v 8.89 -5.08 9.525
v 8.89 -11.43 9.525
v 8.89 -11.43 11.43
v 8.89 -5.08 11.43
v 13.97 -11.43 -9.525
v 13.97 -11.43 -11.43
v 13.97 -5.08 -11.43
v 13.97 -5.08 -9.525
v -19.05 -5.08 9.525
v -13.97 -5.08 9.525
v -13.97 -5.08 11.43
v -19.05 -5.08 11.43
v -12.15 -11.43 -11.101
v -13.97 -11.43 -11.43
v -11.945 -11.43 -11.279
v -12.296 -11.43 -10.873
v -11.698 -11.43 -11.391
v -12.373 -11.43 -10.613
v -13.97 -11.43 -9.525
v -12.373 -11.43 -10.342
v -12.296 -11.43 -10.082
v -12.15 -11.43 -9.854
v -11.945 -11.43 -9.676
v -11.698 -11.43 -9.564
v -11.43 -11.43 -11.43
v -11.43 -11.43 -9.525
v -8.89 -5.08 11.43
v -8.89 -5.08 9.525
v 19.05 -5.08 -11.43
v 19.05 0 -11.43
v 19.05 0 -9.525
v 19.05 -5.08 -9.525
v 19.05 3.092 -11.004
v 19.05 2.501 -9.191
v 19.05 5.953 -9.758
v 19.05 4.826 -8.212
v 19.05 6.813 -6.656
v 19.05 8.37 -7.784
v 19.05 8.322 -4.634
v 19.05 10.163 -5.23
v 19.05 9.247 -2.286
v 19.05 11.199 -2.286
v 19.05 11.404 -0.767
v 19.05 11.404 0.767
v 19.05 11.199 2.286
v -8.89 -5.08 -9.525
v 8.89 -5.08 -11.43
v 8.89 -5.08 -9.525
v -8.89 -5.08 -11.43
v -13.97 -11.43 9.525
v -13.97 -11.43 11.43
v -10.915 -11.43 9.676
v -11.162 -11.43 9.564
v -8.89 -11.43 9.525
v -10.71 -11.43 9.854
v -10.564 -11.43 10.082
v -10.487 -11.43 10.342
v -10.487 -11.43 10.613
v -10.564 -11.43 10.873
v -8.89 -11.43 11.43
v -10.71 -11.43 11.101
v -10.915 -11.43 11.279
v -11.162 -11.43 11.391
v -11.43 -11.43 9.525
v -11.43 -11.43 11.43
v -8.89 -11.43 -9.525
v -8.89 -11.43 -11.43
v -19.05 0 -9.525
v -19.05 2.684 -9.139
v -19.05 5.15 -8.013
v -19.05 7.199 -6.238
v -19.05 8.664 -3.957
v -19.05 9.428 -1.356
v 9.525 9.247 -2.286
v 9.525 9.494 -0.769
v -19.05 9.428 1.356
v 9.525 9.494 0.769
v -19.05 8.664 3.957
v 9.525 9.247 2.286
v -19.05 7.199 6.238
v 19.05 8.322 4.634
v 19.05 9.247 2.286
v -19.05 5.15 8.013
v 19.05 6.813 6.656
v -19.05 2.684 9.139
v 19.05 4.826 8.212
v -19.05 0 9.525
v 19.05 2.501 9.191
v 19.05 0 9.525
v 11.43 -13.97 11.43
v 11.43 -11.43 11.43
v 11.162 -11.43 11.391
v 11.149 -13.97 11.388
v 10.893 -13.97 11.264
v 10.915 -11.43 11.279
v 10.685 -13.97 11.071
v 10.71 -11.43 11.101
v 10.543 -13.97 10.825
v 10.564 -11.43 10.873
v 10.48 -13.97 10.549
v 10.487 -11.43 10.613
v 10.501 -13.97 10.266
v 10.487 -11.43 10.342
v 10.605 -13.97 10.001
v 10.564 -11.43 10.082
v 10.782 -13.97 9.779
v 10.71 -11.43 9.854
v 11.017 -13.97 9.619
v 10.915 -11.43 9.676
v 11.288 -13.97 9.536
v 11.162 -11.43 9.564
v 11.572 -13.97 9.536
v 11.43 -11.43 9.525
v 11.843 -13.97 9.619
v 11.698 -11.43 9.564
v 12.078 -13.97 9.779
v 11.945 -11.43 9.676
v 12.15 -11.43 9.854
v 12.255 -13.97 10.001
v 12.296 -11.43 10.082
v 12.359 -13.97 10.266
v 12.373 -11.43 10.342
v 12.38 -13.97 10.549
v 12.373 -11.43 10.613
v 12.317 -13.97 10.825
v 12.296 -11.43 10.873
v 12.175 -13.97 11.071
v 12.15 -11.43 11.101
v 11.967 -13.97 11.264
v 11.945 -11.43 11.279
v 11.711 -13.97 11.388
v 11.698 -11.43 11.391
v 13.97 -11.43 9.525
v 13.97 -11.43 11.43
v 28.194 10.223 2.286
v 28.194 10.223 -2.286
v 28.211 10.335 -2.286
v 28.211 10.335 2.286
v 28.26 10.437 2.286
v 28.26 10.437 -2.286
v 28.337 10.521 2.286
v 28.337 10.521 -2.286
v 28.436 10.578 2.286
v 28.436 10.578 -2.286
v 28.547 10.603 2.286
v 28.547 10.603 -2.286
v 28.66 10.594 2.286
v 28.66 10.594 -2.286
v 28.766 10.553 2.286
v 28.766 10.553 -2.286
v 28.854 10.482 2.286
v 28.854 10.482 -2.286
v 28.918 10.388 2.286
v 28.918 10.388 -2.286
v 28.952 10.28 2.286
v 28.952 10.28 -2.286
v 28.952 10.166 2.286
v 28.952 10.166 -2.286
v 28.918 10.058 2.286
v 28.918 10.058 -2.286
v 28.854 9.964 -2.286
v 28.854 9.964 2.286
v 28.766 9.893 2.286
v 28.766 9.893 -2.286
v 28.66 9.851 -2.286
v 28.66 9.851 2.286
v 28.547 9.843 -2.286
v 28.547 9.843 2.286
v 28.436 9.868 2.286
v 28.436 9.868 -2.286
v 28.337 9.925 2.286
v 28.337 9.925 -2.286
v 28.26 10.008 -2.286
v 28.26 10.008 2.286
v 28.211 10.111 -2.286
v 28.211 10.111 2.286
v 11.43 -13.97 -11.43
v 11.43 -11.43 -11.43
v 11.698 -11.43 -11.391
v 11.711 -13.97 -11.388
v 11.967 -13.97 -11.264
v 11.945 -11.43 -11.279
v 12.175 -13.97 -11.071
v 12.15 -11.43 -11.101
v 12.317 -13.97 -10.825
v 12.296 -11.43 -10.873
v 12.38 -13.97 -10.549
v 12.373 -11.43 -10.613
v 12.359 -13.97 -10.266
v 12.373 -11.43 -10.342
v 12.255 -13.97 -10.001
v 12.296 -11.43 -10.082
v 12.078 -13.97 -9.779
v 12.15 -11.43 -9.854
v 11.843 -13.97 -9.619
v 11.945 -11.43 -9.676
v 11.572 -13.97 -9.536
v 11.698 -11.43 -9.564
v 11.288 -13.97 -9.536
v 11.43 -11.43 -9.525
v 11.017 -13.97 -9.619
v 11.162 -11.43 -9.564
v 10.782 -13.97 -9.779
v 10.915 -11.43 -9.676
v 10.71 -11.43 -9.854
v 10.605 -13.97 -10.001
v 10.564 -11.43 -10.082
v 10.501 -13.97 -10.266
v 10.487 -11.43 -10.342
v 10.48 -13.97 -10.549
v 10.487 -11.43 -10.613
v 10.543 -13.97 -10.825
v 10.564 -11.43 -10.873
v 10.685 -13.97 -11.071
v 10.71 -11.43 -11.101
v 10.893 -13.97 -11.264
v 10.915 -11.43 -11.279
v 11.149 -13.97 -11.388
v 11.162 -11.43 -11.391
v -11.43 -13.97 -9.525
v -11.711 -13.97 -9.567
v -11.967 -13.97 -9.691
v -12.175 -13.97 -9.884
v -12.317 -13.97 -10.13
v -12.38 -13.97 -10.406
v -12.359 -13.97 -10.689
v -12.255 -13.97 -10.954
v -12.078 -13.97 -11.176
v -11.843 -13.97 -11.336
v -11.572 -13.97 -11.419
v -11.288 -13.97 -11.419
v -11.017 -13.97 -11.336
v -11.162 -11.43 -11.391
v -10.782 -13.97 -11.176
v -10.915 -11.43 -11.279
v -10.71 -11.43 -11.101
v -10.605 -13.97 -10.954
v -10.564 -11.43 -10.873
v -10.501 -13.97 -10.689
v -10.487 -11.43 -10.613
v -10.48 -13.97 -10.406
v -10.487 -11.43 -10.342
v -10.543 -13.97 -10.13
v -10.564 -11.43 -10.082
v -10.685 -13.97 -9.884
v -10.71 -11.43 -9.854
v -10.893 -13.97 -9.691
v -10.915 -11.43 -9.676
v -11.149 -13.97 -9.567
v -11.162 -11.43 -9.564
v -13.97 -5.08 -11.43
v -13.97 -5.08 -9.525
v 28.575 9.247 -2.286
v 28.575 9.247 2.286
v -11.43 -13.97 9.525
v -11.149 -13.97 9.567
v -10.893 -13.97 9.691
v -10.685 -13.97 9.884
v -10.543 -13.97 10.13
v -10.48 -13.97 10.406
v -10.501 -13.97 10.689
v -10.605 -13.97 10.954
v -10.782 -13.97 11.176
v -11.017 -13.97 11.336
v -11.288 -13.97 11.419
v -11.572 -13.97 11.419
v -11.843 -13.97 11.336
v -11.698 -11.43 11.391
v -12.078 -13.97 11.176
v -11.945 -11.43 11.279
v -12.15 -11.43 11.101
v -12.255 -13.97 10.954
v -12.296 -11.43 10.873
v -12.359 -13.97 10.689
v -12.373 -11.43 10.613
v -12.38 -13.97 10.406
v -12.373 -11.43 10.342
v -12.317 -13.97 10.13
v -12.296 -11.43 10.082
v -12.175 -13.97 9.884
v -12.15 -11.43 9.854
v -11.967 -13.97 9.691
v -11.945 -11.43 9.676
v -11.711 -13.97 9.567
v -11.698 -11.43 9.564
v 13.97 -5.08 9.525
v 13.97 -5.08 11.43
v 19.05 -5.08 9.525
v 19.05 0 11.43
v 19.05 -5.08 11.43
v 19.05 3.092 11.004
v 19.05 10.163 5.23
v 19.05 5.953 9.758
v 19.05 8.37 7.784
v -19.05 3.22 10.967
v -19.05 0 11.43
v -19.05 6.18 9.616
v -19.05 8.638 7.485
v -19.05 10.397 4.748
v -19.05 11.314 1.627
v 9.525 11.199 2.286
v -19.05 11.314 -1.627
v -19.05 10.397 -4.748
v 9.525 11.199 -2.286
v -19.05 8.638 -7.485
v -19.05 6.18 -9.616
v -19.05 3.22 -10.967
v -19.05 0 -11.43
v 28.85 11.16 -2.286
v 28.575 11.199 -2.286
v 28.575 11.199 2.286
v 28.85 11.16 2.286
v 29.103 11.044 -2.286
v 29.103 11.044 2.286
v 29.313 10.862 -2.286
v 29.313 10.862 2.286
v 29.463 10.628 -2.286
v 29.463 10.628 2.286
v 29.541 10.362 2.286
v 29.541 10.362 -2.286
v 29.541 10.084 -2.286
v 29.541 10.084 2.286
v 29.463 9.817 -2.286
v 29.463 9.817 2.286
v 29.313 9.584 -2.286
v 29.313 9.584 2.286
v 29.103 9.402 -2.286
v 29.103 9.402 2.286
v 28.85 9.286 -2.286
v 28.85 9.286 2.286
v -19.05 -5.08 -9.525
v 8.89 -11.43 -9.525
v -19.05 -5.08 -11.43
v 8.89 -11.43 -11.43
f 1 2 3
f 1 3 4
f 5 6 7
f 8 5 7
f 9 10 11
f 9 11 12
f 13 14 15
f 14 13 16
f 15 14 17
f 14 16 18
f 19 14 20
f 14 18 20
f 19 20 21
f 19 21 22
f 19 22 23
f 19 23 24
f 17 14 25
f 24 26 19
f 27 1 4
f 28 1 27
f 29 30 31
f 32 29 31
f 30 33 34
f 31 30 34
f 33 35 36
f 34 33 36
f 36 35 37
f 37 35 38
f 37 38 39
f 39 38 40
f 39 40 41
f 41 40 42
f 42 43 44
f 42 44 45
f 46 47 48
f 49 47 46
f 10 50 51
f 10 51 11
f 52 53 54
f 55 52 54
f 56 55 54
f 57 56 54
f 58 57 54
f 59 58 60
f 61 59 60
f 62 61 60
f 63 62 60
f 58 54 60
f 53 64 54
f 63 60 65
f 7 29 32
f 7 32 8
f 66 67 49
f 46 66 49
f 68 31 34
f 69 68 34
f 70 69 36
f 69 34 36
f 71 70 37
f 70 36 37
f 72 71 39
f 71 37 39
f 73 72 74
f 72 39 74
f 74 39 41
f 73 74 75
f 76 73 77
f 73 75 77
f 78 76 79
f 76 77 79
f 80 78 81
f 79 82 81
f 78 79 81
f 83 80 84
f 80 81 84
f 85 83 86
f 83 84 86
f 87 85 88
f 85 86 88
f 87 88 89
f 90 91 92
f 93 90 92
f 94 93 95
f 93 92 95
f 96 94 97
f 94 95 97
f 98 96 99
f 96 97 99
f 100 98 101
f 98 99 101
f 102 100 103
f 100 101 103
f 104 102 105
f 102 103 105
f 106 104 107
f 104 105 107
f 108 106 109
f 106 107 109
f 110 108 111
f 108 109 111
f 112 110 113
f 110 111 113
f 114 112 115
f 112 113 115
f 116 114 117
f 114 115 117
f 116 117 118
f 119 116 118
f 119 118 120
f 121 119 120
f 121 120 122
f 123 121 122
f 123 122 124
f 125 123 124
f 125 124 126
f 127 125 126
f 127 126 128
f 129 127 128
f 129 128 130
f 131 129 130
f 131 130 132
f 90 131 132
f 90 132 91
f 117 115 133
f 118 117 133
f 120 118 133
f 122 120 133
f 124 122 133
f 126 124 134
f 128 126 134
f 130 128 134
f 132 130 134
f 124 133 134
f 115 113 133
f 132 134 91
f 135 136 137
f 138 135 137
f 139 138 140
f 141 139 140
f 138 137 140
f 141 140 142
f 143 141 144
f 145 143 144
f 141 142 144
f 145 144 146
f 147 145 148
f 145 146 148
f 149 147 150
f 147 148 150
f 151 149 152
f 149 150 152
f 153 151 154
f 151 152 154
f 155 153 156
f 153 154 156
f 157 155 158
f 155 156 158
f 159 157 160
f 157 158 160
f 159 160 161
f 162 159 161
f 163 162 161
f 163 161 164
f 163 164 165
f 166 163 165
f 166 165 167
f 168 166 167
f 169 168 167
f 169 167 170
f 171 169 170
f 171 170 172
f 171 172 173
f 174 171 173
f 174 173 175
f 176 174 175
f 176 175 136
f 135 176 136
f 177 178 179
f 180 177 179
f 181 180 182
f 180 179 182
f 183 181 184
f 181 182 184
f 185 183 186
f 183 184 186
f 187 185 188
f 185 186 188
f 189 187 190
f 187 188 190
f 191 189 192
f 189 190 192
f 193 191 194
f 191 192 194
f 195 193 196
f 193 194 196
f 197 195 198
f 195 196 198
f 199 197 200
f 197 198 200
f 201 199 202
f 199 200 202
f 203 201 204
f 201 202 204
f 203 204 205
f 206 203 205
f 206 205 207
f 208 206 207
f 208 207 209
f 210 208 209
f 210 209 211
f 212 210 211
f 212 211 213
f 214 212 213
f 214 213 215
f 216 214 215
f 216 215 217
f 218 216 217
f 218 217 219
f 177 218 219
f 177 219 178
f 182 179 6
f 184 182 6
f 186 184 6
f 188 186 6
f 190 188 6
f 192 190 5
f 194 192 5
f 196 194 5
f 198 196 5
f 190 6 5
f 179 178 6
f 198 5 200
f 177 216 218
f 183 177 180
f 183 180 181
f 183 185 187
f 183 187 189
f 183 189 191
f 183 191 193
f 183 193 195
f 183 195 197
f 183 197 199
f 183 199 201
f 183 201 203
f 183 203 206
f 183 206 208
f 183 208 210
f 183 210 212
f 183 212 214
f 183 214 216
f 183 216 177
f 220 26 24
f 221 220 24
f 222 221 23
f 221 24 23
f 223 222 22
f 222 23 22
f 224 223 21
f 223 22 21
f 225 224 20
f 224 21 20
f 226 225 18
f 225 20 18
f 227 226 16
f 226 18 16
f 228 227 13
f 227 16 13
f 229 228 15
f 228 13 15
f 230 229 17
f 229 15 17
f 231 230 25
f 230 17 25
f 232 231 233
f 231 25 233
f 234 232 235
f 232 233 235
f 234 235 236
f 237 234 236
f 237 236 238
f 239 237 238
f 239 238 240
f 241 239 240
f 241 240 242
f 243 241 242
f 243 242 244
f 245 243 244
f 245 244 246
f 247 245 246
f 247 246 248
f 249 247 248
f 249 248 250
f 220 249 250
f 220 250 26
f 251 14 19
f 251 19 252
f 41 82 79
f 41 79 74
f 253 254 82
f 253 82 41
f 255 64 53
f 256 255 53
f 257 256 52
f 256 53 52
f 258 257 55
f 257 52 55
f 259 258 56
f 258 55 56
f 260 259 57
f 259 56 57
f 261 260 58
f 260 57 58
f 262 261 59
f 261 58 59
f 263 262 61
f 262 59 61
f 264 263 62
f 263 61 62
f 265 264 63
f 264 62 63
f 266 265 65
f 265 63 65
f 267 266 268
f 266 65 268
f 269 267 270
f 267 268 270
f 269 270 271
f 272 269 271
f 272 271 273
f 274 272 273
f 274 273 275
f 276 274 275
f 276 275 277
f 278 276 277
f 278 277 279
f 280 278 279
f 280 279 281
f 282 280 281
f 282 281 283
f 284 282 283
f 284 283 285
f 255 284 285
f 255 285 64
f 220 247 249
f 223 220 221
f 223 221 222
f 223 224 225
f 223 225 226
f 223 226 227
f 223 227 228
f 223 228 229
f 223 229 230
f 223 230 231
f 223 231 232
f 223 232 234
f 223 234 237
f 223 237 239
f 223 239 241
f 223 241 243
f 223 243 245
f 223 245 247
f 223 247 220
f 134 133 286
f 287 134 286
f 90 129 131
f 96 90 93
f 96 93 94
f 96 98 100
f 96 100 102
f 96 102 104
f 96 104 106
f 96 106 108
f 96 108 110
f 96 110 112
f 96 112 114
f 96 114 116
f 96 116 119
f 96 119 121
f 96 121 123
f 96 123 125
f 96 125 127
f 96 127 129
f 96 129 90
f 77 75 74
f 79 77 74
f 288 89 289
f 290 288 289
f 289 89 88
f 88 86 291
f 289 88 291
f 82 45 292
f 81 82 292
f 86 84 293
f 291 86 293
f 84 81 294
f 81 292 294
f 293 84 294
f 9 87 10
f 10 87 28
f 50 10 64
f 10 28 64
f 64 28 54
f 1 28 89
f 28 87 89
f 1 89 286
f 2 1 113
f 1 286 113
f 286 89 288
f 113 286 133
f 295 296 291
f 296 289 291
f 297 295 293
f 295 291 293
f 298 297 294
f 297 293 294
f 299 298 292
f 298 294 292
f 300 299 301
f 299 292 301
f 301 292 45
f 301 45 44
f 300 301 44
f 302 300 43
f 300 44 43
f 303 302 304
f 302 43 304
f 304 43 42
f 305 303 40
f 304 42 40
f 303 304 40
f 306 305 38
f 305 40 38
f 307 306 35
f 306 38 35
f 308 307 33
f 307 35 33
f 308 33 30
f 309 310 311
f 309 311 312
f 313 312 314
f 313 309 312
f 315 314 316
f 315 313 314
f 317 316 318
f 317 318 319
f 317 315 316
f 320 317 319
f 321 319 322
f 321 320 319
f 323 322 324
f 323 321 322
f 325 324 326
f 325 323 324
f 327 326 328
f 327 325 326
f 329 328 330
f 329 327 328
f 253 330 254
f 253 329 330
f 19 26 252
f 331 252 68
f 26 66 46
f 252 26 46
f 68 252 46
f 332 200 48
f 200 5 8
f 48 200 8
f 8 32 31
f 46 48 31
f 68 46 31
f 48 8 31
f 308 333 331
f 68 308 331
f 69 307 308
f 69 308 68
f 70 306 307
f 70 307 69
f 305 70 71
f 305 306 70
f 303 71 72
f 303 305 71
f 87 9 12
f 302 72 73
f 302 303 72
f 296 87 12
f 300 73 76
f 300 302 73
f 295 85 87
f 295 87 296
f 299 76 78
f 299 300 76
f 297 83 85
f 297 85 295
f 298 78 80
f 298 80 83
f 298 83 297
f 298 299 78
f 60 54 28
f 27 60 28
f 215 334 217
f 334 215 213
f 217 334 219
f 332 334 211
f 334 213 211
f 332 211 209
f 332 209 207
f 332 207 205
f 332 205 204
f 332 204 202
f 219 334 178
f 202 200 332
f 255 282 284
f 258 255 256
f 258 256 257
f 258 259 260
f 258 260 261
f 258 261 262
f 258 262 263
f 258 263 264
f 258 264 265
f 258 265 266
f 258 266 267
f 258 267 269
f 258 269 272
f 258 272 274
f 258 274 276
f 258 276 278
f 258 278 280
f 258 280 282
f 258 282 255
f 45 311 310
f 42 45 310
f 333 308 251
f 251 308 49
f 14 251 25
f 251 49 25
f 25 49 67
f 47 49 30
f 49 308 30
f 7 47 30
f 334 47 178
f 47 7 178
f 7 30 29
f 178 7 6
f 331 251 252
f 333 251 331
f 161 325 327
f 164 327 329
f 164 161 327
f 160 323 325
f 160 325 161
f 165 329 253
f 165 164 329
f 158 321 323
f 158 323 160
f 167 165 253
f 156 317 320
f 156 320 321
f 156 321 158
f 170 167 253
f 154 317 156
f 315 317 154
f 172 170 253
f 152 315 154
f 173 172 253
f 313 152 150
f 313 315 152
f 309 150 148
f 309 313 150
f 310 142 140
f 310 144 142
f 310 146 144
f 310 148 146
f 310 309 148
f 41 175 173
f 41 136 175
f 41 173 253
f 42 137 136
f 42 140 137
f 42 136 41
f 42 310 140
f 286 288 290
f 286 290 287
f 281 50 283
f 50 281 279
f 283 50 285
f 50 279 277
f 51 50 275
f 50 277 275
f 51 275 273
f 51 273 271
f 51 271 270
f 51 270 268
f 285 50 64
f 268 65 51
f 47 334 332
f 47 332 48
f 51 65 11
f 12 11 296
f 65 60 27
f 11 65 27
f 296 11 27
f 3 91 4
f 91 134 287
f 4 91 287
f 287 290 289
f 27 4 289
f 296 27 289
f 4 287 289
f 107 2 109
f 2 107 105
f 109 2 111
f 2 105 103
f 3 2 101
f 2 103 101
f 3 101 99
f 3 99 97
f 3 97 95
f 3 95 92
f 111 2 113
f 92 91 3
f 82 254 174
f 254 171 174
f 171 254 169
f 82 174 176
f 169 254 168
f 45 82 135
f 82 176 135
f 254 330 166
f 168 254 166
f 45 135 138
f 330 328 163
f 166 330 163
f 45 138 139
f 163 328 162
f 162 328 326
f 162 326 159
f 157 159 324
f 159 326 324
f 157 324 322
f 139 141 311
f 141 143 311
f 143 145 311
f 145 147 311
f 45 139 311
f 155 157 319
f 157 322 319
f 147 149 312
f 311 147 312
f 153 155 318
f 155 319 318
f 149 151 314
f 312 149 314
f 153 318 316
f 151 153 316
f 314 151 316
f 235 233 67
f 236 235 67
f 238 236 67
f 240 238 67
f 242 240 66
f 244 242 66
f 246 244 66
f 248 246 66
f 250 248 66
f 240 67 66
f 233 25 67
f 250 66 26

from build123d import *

# Parameters (mm, degrees)
BOSS_EXTRUDE1_DEPTH = 19.05
SKETCH2_W           = 4.572
SKETCH2_H           = 1.952455346
BOSS_EXTRUDE2_DEPTH = 9.525
SKETCH3_R           = 0.976227673
BOSS_EXTRUDE3_DEPTH = 4.572
SKETCH4_R           = 0.381
CUT_EXTRUDE1_DEPTH  = 35.526057015
SKETCH5_W           = 5.08
SKETCH5_H           = 6.35
SKETCH5_W_2         = 17.78
CUT_EXTRUDE2_DEPTH  = 40.070443522
SKETCH6_R           = 0.9525
BOSS_EXTRUDE4_DEPTH = 2.54


with BuildPart() as part:
    # Sketch1 → Boss-Extrude1 (new, symmetric)
    with BuildSketch(Plane(origin=(0, 0, 0), x_dir=(0, 0, -1), z_dir=(1, 0, 0))):
        with BuildLine():
            Line((-9.525, 0), (-9.525, -11.43))
            Line((-9.525, -11.43), (-11.43, -11.43))
            Line((-11.43, -11.43), (-11.43, 0))
            ThreePointArc((-11.43, 0), (0, 11.43), (11.43, 0))
            Line((11.43, 0), (11.43, -11.43))
            Line((11.43, -11.43), (9.525, -11.43))
            Line((9.525, -11.43), (9.525, 0))
            ThreePointArc((9.525, 0), (0, 9.525), (-9.525, 0))
        make_face()
    extrude(amount=BOSS_EXTRUDE1_DEPTH, both=True)

    # Sketch2 → Boss-Extrude2 (add, symmetric)
    with BuildSketch(Plane(origin=(19.05, 0, 0), x_dir=(0, 0, -1), z_dir=(1, 0, 0))):
        with Locations((0, 10.222839431)):
            Rectangle(SKETCH2_W, SKETCH2_H)
    extrude(amount=BOSS_EXTRUDE2_DEPTH, both=True)

    # Sketch3 → Boss-Extrude3 (add)
    with BuildSketch(Plane(origin=(0, 0, -2.286), x_dir=(-1, 0, 0), z_dir=(0, 0, -1))):
        with Locations((-28.575, 10.222839431)):
            Circle(SKETCH3_R)
    extrude(amount=-BOSS_EXTRUDE3_DEPTH)

    # Sketch4 → Cut-Extrude1 (cut, through all)
    with BuildSketch(Plane(origin=(0, 0, -2.286), x_dir=(-1, 0, 0), z_dir=(0, 0, -1))):
        with Locations((-28.575, 10.222839431)):
            Circle(SKETCH4_R)
    extrude(amount=-CUT_EXTRUDE1_DEPTH, mode=Mode.SUBTRACT)

    # Sketch5 → Cut-Extrude2 (cut, through all)
    with BuildSketch(Plane(origin=(0, 0, -11.43), x_dir=(-1, 0, 0), z_dir=(0, 0, -1))):
        with Locations((-16.51, -8.255)):
            Rectangle(SKETCH5_W, SKETCH5_H)
        with Locations((0, -8.255)):
            Rectangle(SKETCH5_W_2, SKETCH5_H)
        with Locations((16.51, -8.255)):
            Rectangle(SKETCH5_W, SKETCH5_H)
    extrude(amount=-CUT_EXTRUDE2_DEPTH, mode=Mode.SUBTRACT)

    # Sketch6 → Boss-Extrude4 (add)
    with BuildSketch(Plane.XZ.offset(11.43)):
        with Locations(Location((11.43, -10.4775, 0), (0, 0, 270))):
            Circle(SKETCH6_R)
        with Locations(Location((11.43, 10.4775, 0), (0, 0, 90))):
            Circle(SKETCH6_R)
        with Locations(Location((-11.43, 10.4775, 0), (0, 0, 270))):
            Circle(SKETCH6_R)
        with Locations(Location((-11.43, -10.4775, 0), (0, 0, 90))):
            Circle(SKETCH6_R)
    extrude(amount=BOSS_EXTRUDE4_DEPTH)


solid = part.part
